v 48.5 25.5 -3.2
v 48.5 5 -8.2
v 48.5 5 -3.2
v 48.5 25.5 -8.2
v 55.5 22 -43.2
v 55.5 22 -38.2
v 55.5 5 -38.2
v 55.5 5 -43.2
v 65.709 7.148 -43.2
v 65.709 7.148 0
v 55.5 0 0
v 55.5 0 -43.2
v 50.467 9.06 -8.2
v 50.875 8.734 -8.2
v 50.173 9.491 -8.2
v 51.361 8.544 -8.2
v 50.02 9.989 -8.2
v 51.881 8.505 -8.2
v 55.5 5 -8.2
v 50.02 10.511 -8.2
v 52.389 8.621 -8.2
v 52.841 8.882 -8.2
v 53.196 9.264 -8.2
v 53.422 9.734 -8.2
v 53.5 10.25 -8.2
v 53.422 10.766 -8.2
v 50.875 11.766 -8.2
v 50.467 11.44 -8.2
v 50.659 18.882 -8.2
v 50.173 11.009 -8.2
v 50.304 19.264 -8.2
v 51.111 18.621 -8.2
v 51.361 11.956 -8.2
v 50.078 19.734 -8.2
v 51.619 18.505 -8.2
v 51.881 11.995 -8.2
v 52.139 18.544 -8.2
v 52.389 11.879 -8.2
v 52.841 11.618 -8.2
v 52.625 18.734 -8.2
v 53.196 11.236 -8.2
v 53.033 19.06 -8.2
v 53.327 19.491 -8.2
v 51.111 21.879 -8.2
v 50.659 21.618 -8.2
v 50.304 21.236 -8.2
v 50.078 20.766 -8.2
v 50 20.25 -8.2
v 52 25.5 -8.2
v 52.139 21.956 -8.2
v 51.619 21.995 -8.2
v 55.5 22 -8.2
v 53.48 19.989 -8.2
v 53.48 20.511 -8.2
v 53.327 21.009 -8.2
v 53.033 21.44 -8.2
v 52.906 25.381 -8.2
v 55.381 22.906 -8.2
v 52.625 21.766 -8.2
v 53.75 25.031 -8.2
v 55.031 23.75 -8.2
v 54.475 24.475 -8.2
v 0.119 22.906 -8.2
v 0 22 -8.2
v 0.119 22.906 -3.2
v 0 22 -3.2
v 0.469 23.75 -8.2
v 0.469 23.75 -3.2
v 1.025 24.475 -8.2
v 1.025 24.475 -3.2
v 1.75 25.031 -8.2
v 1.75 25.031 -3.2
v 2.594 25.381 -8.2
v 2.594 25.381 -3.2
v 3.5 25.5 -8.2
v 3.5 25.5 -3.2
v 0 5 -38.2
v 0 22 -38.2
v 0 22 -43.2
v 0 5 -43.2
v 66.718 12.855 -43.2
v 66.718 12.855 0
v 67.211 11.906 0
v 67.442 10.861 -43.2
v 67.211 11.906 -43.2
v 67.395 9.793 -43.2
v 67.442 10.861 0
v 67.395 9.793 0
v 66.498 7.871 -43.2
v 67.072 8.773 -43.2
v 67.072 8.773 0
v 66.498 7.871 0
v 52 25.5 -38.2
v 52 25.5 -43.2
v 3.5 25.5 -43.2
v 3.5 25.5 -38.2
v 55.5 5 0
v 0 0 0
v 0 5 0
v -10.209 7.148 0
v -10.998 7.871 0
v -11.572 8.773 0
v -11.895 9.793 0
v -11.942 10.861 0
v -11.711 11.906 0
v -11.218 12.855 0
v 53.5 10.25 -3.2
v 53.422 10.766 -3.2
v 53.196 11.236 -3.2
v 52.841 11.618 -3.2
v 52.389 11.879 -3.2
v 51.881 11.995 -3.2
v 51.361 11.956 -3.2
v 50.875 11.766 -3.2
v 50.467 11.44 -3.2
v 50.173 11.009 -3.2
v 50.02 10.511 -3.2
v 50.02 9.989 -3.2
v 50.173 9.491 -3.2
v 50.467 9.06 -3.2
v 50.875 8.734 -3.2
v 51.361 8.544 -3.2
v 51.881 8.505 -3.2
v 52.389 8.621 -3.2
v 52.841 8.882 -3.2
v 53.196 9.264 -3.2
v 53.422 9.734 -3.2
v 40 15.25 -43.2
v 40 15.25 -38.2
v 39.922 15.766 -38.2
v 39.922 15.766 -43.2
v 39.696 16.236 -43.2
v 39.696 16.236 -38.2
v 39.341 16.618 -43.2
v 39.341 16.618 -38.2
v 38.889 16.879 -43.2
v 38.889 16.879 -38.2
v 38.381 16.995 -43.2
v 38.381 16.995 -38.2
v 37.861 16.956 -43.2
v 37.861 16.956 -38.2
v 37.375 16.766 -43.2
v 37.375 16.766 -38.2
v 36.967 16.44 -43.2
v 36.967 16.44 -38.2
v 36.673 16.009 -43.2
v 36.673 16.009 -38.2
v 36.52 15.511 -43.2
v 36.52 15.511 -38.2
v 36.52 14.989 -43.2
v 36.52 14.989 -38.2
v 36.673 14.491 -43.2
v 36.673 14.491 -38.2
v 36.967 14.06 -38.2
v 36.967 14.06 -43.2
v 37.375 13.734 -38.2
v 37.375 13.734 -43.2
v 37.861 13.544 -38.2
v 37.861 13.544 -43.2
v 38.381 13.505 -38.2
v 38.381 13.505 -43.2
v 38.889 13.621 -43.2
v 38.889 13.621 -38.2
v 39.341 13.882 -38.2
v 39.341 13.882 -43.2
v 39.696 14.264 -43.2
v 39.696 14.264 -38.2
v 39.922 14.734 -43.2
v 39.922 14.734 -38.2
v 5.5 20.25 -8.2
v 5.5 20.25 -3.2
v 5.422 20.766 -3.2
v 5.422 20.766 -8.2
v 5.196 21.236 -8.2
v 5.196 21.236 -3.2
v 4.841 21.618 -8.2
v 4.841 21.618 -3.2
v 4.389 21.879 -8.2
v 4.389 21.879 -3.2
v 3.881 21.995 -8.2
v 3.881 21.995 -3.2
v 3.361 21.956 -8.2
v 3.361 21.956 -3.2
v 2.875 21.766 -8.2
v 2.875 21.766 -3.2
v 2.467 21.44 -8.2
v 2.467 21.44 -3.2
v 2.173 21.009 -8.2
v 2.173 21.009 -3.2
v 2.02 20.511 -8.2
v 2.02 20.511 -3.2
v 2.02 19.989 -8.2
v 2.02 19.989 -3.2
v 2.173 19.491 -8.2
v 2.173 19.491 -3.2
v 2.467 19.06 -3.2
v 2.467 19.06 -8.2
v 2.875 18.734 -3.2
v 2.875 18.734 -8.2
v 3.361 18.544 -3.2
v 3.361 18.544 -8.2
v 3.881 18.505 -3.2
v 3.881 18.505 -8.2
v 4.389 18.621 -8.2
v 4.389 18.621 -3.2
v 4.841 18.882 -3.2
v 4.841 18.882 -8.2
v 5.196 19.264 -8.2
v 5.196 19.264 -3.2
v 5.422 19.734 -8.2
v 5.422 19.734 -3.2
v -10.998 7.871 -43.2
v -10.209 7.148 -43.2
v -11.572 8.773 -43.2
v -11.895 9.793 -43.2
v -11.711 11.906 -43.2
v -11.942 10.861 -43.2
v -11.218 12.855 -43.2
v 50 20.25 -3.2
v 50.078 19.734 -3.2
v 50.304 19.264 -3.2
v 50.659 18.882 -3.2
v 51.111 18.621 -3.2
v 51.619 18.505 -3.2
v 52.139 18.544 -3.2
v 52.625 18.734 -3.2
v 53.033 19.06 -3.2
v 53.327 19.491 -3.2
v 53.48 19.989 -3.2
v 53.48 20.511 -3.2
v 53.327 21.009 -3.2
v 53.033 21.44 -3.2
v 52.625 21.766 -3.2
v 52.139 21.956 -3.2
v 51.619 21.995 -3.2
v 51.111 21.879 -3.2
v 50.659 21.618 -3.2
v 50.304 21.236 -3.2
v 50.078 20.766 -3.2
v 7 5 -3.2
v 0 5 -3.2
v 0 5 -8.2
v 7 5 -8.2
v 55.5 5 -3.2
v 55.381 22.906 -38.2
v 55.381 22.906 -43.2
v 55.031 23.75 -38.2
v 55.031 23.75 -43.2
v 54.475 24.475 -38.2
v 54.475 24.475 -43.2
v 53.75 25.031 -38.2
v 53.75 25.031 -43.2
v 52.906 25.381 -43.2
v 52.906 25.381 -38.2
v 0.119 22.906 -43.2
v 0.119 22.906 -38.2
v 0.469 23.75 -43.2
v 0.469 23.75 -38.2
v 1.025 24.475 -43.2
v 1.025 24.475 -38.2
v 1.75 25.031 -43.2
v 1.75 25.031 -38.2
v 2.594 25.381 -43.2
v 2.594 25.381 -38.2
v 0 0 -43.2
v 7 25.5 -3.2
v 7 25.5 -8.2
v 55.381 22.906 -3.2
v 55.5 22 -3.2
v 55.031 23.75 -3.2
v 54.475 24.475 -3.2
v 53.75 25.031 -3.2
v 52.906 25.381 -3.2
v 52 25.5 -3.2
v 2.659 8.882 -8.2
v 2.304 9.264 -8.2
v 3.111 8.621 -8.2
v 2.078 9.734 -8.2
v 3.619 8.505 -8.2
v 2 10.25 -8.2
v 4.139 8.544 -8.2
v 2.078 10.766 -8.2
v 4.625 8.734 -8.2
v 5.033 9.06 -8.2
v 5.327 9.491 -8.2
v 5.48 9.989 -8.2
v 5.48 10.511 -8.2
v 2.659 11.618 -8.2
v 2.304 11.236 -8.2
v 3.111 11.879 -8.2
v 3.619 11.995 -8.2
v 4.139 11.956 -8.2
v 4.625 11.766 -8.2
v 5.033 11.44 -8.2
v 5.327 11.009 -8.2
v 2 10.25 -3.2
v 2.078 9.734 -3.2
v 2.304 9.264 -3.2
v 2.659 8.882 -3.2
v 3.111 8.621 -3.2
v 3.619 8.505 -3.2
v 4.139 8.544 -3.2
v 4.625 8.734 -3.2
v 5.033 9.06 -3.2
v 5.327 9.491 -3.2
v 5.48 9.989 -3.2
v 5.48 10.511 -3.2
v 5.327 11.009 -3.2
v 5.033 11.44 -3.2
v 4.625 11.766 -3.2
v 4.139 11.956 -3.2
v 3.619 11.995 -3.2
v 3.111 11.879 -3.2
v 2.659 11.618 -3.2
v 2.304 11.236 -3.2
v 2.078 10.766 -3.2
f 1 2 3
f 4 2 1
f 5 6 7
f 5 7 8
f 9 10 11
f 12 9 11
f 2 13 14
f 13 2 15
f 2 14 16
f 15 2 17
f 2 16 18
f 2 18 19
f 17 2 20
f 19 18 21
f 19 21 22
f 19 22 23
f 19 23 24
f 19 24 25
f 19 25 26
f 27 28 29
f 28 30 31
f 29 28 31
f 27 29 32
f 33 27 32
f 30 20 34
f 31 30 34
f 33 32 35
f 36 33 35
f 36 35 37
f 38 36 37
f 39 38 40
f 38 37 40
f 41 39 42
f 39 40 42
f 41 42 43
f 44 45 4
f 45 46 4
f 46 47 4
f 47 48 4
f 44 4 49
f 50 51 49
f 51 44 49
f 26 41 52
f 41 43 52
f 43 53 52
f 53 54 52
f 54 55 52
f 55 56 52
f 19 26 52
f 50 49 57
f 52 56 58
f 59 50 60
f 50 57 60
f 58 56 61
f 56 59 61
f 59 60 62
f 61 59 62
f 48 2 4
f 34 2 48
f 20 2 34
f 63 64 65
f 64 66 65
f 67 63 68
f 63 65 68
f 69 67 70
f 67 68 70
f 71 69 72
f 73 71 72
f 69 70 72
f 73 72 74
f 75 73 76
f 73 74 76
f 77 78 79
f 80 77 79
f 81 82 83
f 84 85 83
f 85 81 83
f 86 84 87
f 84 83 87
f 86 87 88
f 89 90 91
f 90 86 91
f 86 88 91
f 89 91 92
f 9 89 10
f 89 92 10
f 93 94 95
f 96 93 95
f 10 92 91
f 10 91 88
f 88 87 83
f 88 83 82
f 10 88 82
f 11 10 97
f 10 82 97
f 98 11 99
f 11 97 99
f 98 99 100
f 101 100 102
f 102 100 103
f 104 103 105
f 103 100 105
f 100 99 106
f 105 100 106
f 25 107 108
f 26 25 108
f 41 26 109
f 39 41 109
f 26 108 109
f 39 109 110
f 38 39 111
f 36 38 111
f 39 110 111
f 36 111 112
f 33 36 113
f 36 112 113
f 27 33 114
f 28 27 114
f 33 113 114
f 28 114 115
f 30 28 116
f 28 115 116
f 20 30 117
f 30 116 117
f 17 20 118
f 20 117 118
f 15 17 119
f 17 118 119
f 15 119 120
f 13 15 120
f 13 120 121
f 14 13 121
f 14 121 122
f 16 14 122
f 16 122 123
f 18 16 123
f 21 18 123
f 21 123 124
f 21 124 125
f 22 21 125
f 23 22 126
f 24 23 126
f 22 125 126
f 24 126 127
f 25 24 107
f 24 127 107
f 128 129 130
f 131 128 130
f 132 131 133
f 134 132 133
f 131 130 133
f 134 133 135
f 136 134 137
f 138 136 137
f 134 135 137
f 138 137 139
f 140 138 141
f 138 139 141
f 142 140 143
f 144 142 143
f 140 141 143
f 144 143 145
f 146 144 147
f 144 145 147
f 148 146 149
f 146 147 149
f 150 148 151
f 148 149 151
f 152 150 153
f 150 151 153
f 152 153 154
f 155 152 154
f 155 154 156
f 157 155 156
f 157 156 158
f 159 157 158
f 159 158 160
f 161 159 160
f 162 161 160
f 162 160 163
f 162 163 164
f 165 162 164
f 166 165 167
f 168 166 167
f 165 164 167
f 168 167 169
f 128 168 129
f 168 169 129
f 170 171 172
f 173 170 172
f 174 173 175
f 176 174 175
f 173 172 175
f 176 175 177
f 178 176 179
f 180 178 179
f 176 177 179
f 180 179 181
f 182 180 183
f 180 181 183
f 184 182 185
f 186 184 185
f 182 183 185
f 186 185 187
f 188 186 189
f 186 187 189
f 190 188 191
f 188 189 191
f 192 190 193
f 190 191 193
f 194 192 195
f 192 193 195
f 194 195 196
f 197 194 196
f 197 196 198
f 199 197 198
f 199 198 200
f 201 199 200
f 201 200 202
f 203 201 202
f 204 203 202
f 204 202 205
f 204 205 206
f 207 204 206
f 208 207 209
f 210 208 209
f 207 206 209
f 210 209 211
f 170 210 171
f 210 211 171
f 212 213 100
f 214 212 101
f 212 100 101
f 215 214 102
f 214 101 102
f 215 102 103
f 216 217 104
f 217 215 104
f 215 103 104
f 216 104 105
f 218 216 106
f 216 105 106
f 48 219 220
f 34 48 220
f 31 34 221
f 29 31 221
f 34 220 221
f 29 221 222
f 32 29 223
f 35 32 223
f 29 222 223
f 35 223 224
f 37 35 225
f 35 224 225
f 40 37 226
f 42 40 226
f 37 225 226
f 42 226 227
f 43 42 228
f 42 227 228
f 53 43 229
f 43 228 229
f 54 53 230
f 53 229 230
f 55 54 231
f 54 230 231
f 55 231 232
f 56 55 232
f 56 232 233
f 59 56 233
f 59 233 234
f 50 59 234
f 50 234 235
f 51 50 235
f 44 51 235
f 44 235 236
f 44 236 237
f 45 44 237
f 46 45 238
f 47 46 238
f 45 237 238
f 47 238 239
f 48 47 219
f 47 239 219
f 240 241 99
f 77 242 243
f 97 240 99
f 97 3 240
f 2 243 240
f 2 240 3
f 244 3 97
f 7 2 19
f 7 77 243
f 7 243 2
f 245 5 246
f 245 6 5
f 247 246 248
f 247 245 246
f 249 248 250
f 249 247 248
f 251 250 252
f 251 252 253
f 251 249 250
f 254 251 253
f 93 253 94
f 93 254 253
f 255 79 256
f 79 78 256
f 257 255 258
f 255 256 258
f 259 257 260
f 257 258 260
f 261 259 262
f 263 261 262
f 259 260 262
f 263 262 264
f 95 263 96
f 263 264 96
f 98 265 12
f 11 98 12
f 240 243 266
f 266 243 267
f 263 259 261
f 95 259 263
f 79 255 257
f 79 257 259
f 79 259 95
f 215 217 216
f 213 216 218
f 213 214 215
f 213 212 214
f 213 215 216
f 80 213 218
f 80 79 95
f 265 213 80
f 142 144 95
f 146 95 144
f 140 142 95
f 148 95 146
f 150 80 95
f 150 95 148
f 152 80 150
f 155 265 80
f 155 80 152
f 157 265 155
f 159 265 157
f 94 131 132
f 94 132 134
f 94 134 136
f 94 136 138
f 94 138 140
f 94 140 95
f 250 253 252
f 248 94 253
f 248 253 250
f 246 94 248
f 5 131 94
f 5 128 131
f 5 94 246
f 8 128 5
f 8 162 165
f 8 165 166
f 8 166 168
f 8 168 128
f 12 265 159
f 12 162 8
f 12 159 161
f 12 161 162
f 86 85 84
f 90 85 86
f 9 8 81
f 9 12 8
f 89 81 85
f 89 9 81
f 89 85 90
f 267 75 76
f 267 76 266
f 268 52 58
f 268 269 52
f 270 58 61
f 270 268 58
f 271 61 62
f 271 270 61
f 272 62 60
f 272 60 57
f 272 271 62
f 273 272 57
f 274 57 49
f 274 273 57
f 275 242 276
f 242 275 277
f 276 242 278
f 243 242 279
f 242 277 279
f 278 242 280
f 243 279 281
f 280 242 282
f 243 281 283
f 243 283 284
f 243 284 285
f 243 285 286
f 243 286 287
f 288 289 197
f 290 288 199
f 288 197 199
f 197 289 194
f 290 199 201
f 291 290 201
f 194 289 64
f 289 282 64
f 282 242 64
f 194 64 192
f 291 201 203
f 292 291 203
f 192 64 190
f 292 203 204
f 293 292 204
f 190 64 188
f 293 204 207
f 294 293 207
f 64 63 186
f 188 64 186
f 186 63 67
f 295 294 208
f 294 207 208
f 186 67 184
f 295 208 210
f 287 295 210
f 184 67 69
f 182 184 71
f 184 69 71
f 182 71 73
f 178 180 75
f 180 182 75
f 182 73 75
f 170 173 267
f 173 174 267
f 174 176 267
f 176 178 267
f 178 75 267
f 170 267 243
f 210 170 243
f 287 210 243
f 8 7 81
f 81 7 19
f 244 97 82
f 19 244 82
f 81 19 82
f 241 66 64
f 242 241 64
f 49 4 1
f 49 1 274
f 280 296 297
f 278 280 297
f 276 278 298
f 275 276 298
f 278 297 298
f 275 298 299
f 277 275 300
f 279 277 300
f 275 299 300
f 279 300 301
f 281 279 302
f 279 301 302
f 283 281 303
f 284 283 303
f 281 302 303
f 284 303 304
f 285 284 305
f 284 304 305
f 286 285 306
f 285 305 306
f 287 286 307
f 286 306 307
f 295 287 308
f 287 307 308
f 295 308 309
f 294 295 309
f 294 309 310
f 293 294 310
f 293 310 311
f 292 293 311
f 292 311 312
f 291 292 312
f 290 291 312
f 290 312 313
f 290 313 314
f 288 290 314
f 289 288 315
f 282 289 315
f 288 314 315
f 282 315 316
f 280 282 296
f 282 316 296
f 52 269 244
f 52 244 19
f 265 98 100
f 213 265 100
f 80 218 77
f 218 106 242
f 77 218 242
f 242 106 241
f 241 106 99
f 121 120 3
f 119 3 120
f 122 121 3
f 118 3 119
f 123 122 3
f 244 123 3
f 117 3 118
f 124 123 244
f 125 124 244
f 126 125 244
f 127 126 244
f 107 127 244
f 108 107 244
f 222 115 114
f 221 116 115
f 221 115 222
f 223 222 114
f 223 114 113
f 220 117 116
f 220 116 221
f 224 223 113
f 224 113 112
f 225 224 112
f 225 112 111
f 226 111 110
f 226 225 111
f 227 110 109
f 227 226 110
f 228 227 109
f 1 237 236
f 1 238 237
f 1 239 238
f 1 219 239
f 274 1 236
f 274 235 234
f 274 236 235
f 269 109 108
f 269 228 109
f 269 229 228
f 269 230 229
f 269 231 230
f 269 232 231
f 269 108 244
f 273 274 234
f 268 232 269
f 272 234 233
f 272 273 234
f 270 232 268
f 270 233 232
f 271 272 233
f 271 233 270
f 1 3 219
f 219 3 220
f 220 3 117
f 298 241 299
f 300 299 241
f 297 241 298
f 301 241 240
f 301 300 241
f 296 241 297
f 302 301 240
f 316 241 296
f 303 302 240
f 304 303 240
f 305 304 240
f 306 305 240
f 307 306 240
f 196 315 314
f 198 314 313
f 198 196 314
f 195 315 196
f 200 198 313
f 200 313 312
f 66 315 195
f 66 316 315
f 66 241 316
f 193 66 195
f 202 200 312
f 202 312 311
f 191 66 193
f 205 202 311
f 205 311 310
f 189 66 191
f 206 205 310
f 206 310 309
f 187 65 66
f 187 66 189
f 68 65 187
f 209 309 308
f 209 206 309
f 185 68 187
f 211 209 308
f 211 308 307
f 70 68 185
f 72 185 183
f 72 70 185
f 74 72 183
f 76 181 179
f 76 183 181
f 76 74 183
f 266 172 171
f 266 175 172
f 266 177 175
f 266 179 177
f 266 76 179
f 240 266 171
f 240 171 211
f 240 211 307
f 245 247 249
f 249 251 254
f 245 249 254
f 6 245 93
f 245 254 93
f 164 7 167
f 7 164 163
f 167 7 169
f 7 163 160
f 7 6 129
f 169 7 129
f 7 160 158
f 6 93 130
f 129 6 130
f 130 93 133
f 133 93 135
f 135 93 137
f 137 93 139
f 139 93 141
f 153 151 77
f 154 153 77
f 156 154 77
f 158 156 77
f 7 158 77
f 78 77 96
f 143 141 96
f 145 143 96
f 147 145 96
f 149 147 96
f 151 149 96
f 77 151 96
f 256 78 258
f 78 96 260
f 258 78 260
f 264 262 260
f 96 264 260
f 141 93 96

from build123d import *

# Parameters (mm, degrees)
SKETCH1_W           = 55.5
SKETCH1_H           = 43.2
BASE_DEPTH          = 5
SKETCH2_W           = 55.5
SKETCH2_H           = 25.5
WALL_DEPTH          = 5
SKETCH3_W           = 7
SKETCH3_H           = 20.5
MOUNTINGTABS_DEPTH  = 5
LIPS_REACH          = 76.811
SKETCH5_R           = 1.75
MOUNTINGHOLES_DEPTH = 5
FILLETS_R           = 3.5
SKETCH6_R           = 1.75
THROUGHHOLE_DEPTH   = 5


with BuildPart() as part:
    # Sketch1 → base (new body)
    with BuildSketch(Plane(origin=(0, 0, 0), x_dir=(1, 0, 0), z_dir=(0, 1, 0))):
        with Locations((27.75, 21.6)):
            Rectangle(SKETCH1_W, SKETCH1_H)
    extrude(amount=BASE_DEPTH)

    # Sketch2 → wall (add)
    with BuildSketch(Plane(origin=(0, 0, -43.2), x_dir=(-1, 0, 0), z_dir=(0, 0, -1))):
        with Locations((-27.75, 12.75)):
            Rectangle(SKETCH2_W, SKETCH2_H)
    extrude(amount=-WALL_DEPTH)

    # Sketch3 → mountingTabs (add)
    with BuildSketch(Plane.XY.offset(-8.2)):
        with Locations((3.5, 15.25)):
            Rectangle(SKETCH3_W, SKETCH3_H)
        with Locations((52, 15.25)):
            Rectangle(SKETCH3_W, SKETCH3_H)
    extrude(amount=MOUNTINGTABS_DEPTH)

    # lips: up to this face of the body (flat: up to its plane)
    lips_end = Plane(part.part.faces().sort_by_distance((27.75, 12.75, -43.2))[0])
    # Sketch4 → lips (add, up to the picked face)
    with BuildSketch(Plane.XY, mode=Mode.PRIVATE) as lips_sk1:
        with BuildLine():
            Line((0, 0), (-10.208884478, 7.148337868))
            ThreePointArc((-10.208884478, 7.148337868), (-11.894564223, 9.792816133), (-11.218174515, 12.85505036))
            Line((-11.218174515, 12.85505036), (0, 5))
            Line((0, 5), (0, 0))
        make_face()
    lips_tool1 = split(extrude(lips_sk1.sketch, amount=-LIPS_REACH, mode=Mode.PRIVATE), bisect_by=lips_end, keep=Keep.BOTH, mode=Mode.PRIVATE)
    # Sketch4 → lips (add, up to the picked face)
    with BuildSketch(Plane.XY, mode=Mode.PRIVATE) as lips_sk2:
        with BuildLine():
            Line((55.5, 5), (66.718174515, 12.85505036))
            ThreePointArc((66.718174515, 12.85505036), (67.394564223, 9.792816133), (65.708884478, 7.148337868))
            Line((65.708884478, 7.148337868), (55.5, 0))
            Line((55.5, 0), (55.5, 5))
        make_face()
    lips_tool2 = split(extrude(lips_sk2.sketch, amount=-LIPS_REACH, mode=Mode.PRIVATE), bisect_by=lips_end, keep=Keep.BOTH, mode=Mode.PRIVATE)
    add(lips_tool1.solids().sort_by(Axis((-5.839287, 6.590277, 0), (0, 0, -1)))[0])
    add(lips_tool2.solids().sort_by(Axis((61.339287, 6.590277, 0), (0, 0, -1)))[0])

    # Sketch5 → mountingHoles (cut)
    with BuildSketch(Plane.XY.offset(-3.2)):
        with Locations((3.75, 20.25)):
            Circle(SKETCH5_R)
        with Locations(Location((3.75, 10.25, 0), (0, 0, 180))):
            Circle(SKETCH5_R)
        with Locations((51.75, 10.25)):
            Circle(SKETCH5_R)
        with Locations(Location((51.75, 20.25, 0), (0, 0, 180))):
            Circle(SKETCH5_R)
    extrude(amount=-MOUNTINGHOLES_DEPTH, mode=Mode.SUBTRACT)

    # fillets
    fillets_edges = [part.edges().sort_by_distance(p)[0] for p in [
        (0, 25.5, -40.7),
        (55.5, 25.5, -40.7),
        (0, 25.5, -5.7),
        (55.5, 25.5, -5.7),
    ]]
    fillet(fillets_edges, radius=FILLETS_R)

    # Sketch6 → throughHole (cut)
    with BuildSketch(Plane.XY.offset(-38.2)):
        with Locations((38.25, 15.25)):
            Circle(SKETCH6_R)
    extrude(amount=-THROUGHHOLE_DEPTH, mode=Mode.SUBTRACT)


solid = part.part
